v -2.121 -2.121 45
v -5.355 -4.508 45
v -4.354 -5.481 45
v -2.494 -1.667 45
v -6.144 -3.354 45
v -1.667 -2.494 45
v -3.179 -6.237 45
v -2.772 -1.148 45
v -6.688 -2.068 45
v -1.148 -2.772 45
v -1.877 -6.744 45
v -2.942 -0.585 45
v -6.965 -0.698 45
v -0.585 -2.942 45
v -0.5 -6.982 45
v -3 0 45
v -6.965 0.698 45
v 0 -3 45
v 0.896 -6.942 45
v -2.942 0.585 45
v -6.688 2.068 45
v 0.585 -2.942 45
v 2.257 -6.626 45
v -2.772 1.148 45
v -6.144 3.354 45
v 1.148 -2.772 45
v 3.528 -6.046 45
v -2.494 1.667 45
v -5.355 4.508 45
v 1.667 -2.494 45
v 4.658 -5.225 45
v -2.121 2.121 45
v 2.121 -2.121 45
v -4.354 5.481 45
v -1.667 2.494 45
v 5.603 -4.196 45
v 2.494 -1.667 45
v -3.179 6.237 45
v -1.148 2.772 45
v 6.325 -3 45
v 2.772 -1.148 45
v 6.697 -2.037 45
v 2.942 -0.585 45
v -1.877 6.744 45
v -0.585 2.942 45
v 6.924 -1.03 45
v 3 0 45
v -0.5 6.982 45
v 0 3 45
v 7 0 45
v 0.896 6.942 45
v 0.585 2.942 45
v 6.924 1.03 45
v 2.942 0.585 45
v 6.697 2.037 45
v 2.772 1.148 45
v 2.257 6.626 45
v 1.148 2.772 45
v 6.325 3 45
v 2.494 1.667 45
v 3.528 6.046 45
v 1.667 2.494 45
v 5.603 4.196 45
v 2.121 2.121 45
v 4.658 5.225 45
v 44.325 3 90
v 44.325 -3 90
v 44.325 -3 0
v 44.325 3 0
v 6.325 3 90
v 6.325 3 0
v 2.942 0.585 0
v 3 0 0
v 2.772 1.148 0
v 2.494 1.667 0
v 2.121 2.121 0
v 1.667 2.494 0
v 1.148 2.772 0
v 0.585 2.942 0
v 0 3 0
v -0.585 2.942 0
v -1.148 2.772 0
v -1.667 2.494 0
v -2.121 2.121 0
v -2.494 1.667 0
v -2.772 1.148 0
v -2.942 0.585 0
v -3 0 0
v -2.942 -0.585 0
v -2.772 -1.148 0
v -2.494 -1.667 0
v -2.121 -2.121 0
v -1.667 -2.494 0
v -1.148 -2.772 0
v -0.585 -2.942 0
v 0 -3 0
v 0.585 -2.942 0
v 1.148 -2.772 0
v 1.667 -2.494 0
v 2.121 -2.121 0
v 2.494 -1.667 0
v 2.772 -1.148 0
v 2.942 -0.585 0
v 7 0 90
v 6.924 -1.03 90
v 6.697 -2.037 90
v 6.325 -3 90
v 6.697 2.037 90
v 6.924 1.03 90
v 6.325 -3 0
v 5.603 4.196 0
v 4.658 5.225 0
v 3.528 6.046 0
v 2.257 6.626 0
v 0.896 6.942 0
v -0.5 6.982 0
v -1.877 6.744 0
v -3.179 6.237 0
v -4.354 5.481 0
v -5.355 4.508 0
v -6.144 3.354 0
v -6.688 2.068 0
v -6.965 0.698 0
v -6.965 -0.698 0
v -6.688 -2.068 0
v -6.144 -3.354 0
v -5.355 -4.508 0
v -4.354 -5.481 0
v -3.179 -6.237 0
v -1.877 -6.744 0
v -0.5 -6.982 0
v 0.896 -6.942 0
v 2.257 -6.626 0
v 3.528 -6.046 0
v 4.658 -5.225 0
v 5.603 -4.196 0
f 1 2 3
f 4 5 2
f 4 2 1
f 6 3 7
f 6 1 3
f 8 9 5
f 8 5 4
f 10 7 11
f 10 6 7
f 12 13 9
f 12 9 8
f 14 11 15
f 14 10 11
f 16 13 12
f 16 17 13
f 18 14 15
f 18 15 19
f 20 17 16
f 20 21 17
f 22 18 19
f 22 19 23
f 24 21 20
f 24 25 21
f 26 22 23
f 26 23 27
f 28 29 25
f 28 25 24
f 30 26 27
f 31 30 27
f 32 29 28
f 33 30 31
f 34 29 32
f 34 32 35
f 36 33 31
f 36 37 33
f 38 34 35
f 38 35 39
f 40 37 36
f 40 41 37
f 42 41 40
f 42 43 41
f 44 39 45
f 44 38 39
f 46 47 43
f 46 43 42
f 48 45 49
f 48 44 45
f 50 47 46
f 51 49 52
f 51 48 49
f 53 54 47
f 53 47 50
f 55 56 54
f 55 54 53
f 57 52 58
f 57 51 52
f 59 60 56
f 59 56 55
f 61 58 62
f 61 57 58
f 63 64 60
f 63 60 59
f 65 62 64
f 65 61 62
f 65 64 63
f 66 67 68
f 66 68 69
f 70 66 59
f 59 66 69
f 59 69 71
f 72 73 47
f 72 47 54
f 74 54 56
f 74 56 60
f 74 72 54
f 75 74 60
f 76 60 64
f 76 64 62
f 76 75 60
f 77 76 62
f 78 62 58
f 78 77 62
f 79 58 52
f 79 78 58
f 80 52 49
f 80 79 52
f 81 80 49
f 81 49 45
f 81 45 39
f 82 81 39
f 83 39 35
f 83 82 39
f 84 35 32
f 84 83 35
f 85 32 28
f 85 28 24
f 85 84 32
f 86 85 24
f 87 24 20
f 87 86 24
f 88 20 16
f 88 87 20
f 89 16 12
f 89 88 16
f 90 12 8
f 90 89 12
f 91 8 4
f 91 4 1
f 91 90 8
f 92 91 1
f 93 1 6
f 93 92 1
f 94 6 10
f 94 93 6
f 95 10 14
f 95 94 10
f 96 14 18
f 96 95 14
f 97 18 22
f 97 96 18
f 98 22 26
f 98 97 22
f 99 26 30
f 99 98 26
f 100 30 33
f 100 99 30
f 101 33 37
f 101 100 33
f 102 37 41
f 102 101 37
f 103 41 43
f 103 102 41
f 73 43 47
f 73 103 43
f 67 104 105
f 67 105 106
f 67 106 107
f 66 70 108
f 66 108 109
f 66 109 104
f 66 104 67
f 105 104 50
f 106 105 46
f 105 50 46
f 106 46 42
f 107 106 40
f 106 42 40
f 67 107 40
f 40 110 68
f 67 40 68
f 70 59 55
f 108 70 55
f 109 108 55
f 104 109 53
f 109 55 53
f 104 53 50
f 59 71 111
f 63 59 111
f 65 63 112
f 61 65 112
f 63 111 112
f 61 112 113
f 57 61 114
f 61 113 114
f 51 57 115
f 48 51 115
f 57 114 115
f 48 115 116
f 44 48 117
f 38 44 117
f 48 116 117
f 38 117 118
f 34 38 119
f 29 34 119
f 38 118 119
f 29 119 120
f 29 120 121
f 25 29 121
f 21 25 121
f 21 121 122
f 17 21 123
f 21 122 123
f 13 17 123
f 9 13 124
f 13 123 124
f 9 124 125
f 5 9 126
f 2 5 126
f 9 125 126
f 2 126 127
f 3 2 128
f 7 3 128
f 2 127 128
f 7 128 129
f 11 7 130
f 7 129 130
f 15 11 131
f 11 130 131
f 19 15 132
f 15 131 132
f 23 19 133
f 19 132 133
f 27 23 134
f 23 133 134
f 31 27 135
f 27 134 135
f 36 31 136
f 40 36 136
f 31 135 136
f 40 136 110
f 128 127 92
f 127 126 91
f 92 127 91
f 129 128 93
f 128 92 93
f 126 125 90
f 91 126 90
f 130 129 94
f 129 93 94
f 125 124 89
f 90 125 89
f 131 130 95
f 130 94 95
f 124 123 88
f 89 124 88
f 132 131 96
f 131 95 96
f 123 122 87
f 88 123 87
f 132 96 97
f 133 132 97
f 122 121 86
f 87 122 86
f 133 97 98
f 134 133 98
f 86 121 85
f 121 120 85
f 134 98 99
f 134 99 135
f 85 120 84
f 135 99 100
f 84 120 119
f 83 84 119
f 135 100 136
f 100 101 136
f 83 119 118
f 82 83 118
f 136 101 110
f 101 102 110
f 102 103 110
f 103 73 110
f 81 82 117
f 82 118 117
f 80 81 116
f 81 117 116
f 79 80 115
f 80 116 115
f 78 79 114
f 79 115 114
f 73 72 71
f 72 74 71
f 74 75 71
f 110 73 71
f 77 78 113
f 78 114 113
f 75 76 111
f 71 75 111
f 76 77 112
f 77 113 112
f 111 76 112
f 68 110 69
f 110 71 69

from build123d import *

# Parameters (mm, degrees)
F1_DEPTH = 90
F0_R     = 3
F2_DEPTH = 45


with BuildPart() as f1:
    # F0 (on Top) → F1 (new body)
    with BuildSketch(Plane.XY):
        with BuildLine():
            ThreePointArc((6.324555, 3), (6.829051, 1.537549), (7, 0))
            ThreePointArc((7, 0), (6.829051, -1.537549), (6.324555, -3))
            Line((6.324555, -3), (44.324555, -3))
            Line((44.324555, -3), (44.324555, 3))
            Line((44.324555, 3), (6.324555, 3))
        make_face()
    extrude(amount=F1_DEPTH)

    # F0 (on Top) → F2 (join)
    with BuildSketch(Plane.XY):
        with BuildLine():
            ThreePointArc((6.324555, -3), (6.829051, -1.537549), (7, 0))
            ThreePointArc((7, 0), (6.829051, 1.537549), (6.324555, 3))
            ThreePointArc((6.324555, 3), (-7, 0), (6.324555, -3))
        make_face()
        Circle(F0_R, mode=Mode.SUBTRACT)
    extrude(amount=F2_DEPTH)


solid = f1.part
